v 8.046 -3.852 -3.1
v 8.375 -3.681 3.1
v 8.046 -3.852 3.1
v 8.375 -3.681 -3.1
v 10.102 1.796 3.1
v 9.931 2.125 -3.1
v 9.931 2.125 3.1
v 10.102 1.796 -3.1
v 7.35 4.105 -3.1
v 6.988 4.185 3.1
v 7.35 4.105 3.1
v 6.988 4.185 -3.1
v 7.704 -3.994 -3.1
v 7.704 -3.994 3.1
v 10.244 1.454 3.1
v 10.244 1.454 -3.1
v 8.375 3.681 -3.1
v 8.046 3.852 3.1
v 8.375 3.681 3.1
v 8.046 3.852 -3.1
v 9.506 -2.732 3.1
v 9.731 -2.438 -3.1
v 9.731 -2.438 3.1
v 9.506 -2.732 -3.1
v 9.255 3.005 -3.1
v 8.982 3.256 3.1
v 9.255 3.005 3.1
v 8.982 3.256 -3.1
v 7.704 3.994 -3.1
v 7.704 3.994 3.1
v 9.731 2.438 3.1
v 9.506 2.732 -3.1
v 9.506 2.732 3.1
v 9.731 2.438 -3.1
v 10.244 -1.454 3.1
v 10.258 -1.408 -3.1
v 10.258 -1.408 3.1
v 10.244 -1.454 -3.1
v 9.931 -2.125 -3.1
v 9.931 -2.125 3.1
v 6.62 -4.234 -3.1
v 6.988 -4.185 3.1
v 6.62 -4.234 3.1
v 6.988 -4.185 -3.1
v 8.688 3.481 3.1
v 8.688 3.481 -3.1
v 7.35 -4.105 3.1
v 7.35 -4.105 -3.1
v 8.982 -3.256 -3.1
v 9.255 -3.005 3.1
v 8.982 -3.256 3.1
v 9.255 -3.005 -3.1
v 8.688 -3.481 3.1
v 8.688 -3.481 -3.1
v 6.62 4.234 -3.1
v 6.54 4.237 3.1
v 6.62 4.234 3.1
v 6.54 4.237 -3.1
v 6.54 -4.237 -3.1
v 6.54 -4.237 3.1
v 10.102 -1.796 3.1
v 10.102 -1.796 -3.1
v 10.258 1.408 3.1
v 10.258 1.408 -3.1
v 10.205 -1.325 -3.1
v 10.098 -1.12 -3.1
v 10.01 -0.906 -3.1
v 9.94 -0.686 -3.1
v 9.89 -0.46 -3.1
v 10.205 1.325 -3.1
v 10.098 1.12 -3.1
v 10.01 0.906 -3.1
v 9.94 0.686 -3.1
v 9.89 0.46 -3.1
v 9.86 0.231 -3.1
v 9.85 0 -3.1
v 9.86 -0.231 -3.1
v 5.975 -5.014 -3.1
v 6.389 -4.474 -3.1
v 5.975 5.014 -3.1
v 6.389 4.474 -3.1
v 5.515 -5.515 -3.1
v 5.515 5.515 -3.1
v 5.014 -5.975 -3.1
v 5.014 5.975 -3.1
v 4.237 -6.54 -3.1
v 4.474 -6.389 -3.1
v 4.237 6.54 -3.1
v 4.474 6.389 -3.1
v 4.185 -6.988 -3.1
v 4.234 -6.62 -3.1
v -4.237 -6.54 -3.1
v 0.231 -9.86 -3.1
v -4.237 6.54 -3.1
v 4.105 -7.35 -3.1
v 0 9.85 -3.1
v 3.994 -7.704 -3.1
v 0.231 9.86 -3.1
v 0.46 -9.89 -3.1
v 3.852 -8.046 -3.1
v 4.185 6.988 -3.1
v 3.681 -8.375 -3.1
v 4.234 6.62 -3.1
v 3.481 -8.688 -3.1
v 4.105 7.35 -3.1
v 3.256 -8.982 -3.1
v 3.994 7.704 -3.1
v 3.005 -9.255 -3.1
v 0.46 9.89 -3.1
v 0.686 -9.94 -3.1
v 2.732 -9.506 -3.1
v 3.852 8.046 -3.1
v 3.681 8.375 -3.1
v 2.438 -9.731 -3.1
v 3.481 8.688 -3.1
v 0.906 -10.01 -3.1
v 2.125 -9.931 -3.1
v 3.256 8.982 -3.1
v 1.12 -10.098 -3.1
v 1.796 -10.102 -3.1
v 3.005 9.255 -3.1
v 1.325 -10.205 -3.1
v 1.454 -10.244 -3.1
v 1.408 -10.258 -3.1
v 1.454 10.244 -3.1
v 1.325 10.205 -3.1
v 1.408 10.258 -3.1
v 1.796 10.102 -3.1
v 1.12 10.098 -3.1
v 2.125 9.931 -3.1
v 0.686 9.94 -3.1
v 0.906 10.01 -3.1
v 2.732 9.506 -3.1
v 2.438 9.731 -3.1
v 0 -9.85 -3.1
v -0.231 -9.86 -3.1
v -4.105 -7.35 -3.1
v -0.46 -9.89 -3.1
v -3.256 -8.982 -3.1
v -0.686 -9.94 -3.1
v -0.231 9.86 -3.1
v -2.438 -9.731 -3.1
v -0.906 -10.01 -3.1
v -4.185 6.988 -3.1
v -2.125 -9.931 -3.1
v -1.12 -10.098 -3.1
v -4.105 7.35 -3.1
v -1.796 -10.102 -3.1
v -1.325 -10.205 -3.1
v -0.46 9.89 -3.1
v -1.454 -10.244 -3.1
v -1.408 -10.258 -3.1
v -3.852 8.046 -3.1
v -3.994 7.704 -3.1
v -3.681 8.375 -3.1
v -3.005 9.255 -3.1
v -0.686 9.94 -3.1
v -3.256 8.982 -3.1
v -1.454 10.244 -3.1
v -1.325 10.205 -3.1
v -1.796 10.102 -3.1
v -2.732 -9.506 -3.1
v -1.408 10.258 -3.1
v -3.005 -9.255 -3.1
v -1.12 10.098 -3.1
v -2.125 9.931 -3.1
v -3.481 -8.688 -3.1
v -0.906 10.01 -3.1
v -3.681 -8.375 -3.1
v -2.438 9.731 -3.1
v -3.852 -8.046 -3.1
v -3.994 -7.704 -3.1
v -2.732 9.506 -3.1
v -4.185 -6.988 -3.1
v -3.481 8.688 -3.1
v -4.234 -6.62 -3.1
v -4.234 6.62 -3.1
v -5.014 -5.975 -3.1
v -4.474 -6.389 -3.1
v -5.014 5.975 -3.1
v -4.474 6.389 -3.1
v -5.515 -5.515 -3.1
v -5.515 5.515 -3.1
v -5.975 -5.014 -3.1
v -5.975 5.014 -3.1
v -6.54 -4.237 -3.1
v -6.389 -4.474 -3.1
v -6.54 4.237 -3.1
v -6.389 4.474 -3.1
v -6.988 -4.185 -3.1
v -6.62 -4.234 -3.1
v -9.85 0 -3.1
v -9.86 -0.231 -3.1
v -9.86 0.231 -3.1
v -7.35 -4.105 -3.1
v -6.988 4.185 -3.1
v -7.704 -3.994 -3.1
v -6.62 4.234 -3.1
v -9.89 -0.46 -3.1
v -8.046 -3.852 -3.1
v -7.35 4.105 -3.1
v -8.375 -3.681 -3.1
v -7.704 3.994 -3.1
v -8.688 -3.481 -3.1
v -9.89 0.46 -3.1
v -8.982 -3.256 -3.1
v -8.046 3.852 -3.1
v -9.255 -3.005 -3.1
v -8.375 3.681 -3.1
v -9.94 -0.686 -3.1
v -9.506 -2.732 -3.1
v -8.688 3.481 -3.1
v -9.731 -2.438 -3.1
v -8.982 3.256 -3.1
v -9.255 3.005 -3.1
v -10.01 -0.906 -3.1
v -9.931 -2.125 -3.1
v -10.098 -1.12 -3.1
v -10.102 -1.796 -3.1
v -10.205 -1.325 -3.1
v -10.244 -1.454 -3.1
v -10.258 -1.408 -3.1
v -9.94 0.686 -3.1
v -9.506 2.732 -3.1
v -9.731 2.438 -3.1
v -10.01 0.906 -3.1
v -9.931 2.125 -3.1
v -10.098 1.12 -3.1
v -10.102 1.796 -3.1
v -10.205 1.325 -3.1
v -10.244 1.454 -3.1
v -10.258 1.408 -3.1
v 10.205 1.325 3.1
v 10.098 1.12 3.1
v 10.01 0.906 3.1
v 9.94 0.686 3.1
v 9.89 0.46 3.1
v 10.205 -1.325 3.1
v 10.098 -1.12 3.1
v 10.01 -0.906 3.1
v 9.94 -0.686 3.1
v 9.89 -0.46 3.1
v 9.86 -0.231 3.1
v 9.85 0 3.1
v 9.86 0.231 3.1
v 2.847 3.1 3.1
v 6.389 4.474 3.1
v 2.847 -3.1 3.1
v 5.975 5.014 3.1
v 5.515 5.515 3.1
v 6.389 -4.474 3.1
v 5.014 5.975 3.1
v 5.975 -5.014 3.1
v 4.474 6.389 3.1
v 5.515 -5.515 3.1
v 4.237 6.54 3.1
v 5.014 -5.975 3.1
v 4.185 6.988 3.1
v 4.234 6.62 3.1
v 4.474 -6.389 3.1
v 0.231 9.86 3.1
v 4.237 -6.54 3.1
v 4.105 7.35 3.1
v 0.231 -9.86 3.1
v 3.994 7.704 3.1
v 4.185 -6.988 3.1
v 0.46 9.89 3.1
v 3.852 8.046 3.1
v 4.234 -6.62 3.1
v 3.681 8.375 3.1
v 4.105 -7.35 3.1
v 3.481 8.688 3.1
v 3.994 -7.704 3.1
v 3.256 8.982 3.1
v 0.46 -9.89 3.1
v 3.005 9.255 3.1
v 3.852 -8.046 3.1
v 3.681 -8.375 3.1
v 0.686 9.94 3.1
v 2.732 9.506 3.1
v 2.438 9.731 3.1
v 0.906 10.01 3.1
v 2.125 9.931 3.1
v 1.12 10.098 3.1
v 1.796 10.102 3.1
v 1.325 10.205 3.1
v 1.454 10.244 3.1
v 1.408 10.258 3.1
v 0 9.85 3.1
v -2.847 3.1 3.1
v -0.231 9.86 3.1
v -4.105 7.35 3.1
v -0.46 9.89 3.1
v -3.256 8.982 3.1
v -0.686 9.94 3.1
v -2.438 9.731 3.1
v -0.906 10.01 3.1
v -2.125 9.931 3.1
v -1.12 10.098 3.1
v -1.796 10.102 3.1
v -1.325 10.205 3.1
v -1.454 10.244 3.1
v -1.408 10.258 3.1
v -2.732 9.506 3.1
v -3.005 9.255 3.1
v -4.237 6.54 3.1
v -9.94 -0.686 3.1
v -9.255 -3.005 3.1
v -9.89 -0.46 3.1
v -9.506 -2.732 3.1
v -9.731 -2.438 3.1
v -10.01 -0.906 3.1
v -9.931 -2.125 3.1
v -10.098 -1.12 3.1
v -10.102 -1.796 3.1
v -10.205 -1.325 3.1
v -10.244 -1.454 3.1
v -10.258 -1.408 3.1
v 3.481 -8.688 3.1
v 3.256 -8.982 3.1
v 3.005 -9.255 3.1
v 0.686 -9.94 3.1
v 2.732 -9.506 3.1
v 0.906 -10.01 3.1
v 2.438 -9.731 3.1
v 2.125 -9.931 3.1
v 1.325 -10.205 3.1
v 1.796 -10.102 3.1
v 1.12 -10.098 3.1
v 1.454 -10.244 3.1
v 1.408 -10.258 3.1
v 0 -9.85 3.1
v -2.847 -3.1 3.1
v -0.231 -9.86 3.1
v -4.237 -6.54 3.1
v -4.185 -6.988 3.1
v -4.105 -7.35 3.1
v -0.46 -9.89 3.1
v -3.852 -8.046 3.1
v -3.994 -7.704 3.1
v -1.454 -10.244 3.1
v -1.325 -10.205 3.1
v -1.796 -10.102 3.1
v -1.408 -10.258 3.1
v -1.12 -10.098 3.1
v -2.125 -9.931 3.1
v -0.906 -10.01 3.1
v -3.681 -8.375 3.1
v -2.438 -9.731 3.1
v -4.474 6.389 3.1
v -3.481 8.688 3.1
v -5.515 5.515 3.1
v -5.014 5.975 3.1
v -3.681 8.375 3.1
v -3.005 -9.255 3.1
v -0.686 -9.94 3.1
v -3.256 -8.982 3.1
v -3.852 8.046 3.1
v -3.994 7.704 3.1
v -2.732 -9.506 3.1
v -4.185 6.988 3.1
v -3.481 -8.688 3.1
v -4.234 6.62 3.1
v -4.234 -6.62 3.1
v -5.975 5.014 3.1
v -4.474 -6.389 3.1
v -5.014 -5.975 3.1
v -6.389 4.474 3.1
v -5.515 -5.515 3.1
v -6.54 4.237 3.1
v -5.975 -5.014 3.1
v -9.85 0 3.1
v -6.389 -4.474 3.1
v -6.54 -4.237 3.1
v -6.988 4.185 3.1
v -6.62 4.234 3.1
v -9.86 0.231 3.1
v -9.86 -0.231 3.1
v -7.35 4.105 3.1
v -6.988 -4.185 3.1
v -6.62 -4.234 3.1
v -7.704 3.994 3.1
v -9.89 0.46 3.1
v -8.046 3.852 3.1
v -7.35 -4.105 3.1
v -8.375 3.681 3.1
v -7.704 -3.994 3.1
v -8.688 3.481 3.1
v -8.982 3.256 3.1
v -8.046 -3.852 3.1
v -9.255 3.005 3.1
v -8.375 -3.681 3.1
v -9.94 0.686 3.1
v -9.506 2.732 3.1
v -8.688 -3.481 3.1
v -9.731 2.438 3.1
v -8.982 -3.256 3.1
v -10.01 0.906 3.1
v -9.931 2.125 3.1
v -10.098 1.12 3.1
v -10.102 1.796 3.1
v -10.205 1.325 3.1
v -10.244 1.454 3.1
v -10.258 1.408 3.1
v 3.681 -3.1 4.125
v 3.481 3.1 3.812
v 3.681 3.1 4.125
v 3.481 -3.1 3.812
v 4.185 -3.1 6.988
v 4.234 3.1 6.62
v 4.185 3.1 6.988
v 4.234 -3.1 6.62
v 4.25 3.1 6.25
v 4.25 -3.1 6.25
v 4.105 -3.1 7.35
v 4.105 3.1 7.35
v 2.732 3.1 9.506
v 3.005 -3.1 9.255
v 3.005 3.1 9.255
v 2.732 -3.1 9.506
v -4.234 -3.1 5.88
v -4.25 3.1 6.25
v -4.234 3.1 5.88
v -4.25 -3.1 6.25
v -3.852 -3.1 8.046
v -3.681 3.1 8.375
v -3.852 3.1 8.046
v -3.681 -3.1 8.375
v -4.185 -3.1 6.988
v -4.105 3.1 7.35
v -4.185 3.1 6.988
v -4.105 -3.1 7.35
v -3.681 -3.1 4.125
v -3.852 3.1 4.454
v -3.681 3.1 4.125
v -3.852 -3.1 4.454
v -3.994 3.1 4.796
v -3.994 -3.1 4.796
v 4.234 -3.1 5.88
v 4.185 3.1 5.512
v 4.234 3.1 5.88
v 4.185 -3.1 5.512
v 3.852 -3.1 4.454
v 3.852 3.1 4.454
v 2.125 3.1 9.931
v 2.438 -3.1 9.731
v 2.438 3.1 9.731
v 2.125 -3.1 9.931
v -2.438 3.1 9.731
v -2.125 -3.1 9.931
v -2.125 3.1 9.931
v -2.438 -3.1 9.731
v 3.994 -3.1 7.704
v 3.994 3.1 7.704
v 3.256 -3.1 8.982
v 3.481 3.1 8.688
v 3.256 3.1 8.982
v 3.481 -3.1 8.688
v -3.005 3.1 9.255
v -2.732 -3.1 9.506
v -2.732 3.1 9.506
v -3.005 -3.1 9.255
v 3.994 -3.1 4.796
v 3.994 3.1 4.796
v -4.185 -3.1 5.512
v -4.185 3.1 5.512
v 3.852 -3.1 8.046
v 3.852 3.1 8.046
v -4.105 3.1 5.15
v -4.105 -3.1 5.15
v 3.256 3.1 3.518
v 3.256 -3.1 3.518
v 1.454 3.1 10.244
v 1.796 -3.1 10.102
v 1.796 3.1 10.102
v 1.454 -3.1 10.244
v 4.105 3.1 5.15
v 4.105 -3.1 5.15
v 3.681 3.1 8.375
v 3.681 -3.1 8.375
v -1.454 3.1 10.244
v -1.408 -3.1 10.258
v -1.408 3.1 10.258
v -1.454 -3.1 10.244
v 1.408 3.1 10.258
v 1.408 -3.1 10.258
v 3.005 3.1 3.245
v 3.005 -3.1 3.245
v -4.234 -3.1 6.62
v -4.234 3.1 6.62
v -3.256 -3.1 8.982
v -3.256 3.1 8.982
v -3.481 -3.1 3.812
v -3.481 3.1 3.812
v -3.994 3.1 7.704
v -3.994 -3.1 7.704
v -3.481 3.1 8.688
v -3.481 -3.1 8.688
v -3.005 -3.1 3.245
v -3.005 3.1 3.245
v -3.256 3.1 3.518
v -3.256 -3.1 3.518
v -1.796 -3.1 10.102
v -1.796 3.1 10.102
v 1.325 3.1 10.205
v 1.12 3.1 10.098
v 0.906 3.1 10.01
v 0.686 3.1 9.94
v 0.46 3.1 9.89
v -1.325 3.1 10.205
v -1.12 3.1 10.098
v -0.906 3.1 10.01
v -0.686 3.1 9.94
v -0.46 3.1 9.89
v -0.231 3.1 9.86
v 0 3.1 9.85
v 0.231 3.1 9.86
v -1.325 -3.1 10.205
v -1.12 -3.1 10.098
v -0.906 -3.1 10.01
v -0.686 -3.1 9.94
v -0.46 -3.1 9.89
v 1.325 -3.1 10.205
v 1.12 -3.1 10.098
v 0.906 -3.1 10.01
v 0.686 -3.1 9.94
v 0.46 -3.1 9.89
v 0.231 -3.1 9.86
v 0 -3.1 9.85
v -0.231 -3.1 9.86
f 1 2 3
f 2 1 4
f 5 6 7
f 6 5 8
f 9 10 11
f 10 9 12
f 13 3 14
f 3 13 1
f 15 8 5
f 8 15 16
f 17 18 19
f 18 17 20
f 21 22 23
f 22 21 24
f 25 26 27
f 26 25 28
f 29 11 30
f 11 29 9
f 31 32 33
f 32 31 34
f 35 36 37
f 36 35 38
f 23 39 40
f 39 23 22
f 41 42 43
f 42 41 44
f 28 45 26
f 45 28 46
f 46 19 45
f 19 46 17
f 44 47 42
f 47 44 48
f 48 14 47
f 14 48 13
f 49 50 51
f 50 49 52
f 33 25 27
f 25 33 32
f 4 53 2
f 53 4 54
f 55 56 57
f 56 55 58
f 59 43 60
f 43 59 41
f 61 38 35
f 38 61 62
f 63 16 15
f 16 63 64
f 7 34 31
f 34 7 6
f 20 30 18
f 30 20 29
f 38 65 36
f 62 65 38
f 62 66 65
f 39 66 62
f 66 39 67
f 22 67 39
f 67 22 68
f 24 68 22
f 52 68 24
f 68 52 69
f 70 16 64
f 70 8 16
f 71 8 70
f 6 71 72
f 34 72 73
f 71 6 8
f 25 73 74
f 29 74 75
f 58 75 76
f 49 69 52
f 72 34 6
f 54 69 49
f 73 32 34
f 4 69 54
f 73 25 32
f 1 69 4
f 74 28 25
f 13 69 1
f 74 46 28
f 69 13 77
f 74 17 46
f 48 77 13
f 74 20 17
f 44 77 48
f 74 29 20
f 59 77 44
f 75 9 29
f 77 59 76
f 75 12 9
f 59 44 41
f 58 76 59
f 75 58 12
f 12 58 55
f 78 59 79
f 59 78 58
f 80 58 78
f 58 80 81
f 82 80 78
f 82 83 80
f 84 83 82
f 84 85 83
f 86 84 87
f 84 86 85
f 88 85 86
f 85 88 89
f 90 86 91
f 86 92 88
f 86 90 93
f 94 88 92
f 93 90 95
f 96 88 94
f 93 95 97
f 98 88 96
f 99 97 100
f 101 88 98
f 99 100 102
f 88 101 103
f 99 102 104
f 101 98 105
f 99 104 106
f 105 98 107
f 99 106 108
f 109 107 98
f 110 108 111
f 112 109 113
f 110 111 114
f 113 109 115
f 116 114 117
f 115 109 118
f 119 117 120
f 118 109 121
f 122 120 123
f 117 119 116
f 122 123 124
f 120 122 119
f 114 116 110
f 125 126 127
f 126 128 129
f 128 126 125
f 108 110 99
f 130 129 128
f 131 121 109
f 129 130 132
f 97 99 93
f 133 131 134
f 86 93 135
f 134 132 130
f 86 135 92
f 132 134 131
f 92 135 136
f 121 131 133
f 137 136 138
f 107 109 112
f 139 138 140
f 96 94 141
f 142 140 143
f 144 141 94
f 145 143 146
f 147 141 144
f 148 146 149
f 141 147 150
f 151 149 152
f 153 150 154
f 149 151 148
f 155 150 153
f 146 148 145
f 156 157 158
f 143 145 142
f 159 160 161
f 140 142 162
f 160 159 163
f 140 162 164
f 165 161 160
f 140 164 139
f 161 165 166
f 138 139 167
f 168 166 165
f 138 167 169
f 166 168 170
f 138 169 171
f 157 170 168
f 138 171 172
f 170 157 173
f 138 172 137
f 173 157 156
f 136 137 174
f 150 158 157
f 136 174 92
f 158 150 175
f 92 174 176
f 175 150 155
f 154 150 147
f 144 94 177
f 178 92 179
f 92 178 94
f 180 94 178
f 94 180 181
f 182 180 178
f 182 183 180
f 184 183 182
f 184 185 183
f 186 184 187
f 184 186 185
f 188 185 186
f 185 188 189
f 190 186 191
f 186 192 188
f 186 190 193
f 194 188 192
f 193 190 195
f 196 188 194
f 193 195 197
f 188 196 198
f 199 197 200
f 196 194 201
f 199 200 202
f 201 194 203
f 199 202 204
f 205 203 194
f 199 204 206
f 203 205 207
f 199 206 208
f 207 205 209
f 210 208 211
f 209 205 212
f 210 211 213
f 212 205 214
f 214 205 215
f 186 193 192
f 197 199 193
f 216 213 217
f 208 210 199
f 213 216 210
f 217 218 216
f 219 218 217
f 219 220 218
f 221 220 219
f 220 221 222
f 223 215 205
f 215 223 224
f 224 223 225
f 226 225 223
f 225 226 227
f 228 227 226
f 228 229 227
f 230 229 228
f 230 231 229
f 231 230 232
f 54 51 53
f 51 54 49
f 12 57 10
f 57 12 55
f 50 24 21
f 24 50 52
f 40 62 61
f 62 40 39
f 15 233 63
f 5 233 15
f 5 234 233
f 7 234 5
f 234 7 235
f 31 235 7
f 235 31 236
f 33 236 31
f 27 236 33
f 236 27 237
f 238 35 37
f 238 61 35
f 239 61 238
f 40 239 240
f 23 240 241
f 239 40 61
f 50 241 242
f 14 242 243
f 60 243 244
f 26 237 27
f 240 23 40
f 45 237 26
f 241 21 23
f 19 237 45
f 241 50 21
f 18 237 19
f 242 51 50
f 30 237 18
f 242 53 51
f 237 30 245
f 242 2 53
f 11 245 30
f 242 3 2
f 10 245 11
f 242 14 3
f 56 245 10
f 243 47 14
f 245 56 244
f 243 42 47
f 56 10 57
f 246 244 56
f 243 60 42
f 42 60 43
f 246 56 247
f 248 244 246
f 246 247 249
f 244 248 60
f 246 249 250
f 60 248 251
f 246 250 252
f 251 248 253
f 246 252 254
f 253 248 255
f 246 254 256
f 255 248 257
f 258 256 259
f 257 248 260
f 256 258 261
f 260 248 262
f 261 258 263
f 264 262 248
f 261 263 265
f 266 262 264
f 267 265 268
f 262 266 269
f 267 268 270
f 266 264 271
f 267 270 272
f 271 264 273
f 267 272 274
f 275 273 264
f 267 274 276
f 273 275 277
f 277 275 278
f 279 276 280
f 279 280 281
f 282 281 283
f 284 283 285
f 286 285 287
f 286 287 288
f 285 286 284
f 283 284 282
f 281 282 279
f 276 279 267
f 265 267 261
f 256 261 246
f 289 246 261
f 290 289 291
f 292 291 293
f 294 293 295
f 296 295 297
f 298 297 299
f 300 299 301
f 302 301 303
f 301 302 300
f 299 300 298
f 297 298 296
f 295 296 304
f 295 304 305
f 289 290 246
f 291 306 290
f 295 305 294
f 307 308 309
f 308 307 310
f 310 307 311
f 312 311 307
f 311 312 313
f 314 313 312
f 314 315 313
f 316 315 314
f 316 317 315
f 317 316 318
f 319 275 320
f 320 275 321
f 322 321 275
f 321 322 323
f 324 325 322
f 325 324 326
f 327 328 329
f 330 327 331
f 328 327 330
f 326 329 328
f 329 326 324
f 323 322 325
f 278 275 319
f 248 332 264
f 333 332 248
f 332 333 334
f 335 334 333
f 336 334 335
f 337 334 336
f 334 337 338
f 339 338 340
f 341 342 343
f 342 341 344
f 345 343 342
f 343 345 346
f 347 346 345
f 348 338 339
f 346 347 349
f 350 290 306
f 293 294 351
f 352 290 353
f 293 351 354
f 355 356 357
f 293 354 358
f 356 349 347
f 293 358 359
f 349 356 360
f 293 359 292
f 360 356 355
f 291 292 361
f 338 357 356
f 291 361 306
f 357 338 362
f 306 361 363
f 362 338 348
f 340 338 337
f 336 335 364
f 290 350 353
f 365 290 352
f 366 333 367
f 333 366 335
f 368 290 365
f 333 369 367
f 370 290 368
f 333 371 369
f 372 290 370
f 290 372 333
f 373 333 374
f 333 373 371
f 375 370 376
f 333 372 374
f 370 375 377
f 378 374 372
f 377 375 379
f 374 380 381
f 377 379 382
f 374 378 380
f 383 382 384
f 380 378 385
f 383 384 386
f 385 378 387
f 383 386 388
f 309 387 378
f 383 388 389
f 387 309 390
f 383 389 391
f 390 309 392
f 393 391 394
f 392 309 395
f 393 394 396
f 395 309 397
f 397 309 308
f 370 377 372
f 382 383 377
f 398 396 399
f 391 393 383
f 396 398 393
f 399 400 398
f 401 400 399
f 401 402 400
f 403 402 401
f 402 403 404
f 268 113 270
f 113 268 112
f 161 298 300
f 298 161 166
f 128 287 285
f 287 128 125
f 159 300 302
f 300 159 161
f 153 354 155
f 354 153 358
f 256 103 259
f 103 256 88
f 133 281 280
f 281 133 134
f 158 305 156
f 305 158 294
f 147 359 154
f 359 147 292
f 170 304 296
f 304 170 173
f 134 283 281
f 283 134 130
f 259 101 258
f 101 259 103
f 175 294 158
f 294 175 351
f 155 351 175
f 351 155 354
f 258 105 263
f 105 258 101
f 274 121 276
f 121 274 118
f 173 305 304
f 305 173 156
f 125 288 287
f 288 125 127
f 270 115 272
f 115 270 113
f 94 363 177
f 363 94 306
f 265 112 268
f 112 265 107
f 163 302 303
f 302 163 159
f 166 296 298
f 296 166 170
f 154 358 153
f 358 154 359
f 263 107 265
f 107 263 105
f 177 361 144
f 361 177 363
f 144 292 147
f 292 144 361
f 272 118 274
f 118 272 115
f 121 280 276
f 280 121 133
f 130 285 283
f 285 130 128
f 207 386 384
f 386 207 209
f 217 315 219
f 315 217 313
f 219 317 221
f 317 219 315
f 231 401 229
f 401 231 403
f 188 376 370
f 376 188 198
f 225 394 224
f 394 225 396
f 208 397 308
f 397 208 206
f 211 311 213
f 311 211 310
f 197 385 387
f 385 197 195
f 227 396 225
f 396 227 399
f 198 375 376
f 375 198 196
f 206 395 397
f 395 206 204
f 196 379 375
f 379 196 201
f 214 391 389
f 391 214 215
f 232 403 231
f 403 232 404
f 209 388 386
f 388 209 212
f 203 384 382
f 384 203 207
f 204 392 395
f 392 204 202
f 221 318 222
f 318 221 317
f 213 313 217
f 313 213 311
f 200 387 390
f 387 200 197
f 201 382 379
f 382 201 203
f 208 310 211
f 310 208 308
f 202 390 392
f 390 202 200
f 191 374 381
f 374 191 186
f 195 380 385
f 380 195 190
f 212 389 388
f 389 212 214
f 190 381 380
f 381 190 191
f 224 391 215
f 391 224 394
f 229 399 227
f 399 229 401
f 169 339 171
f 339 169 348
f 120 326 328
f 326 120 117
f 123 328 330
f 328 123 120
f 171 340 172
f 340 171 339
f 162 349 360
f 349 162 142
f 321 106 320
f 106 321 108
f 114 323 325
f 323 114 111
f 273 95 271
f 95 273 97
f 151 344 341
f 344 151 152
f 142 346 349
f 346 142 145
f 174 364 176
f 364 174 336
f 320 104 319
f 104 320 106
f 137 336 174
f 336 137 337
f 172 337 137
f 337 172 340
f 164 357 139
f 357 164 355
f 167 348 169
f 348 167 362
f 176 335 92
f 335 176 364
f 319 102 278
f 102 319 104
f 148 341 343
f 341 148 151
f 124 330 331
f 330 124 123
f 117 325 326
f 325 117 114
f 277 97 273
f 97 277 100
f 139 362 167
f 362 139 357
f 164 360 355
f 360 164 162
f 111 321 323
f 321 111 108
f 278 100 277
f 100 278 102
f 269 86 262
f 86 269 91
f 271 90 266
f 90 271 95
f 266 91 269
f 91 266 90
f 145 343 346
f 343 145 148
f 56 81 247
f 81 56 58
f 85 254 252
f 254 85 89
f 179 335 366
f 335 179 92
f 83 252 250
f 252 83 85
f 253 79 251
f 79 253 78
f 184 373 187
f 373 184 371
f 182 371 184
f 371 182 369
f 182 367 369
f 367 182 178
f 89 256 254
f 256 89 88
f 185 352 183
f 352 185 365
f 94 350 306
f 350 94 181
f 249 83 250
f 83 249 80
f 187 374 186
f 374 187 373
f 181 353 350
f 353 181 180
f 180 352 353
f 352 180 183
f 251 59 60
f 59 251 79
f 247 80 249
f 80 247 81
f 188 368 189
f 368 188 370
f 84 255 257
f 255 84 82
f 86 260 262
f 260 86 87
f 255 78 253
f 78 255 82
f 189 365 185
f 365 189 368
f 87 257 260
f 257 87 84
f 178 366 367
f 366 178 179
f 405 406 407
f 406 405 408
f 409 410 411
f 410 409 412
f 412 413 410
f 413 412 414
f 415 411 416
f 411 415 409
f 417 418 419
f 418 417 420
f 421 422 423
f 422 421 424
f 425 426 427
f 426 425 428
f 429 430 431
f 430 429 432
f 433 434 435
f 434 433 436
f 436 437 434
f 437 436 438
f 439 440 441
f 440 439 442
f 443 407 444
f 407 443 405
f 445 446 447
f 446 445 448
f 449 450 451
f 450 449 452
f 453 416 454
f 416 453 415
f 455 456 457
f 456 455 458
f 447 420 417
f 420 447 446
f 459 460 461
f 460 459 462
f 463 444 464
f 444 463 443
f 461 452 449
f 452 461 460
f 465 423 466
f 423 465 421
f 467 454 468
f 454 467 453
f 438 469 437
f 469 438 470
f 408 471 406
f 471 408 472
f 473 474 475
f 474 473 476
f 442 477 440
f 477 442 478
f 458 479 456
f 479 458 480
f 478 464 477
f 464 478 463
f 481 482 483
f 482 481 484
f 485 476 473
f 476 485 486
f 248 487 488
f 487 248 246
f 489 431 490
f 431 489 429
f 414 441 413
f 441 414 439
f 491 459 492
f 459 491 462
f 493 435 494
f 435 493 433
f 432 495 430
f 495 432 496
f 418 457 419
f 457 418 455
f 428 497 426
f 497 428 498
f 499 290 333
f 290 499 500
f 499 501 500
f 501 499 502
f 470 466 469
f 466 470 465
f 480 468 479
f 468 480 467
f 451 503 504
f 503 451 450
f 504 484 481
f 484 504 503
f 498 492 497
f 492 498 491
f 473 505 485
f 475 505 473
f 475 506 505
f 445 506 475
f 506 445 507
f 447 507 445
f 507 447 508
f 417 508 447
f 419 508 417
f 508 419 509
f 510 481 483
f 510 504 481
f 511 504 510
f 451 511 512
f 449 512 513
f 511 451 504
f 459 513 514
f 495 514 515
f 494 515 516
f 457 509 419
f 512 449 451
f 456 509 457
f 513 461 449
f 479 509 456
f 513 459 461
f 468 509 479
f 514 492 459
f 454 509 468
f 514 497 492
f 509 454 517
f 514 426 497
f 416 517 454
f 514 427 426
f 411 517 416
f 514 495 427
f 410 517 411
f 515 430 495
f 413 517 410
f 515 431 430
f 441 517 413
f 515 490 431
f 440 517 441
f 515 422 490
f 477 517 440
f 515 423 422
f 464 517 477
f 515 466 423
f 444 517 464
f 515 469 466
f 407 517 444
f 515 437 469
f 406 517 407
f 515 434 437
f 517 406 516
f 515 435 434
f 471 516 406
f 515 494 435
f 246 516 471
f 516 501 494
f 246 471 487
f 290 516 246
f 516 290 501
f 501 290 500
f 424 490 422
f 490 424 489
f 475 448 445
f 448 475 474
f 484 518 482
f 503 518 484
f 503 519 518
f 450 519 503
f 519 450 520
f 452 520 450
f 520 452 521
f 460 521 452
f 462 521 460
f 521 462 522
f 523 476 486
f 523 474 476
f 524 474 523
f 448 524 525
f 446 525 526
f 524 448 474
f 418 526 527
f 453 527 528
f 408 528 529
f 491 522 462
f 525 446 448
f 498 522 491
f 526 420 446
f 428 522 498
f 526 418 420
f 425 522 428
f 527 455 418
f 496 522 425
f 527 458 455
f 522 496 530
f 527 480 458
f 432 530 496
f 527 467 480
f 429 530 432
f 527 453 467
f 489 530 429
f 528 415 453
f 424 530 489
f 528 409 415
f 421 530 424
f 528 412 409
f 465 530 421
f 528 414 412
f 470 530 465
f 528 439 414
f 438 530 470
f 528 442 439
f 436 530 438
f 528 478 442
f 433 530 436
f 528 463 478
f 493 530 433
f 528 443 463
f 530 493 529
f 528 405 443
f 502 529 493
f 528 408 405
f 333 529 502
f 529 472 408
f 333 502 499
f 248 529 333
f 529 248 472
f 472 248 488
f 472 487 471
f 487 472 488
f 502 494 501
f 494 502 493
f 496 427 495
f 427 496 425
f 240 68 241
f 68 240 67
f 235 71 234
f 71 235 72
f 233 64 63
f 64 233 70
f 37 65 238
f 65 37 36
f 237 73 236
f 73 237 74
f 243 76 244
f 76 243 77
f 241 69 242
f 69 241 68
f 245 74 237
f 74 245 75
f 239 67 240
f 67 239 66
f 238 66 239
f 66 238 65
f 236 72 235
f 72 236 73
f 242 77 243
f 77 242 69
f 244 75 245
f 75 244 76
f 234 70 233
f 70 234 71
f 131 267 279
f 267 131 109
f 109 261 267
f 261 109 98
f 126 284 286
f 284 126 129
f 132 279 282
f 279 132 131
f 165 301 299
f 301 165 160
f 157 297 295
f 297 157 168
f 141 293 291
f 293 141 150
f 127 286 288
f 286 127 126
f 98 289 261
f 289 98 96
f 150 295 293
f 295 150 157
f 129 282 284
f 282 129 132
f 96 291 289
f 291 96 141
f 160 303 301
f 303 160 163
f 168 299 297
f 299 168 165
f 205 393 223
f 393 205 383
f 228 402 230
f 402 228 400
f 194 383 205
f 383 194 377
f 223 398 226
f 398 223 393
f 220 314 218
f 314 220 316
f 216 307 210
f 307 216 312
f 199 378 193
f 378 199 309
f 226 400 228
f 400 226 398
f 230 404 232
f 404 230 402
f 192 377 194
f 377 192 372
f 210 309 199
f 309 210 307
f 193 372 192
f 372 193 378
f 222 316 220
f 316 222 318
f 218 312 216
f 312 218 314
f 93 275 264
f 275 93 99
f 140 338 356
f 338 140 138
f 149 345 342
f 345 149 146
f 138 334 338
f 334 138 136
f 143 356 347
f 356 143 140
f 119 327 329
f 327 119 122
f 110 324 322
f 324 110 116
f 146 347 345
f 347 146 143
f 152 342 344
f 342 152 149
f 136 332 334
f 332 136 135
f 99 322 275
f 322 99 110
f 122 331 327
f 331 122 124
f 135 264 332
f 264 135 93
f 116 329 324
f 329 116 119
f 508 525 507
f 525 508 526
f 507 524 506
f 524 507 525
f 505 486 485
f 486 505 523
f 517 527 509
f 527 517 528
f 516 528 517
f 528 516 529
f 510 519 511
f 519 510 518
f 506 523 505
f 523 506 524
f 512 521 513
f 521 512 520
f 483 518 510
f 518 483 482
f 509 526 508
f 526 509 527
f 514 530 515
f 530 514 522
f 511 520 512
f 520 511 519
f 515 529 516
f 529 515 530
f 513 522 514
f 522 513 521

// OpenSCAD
$fn = 72;

thickness = 6.2;
hub_r = 7.8;
arm_r = 4.25;
port_dist = 12.5;
hole_r = 2.65;

module connector_4way_3d() {
  difference() {
    union() {
      cylinder(h=thickness, r=hub_r, center=true);
      
      // four planar arms
      for (a = [0,90,180,270]) {
        rotate([0,0,a])
          translate([port_dist/2, 0, 0])
            cylinder(h=thickness, r=arm_r, center=true);
      }
      
      // upward arm (3D)
      translate([0, 0, port_dist/2])
        rotate([90,0,0])
          cylinder(h=thickness, r=arm_r, center=true);
    }
    
    // holes
    for (a = [0,90,180,270]) {
      rotate([0,0,a])
        translate([port_dist, 0, 0])
          cylinder(h=thickness+2, r=hole_r, center=true);
    }
    translate([0, 0, port_dist])
      rotate([90,0,0])
        cylinder(h=thickness+2, r=hole_r, center=true);
  }
}

connector_4way_3d();
